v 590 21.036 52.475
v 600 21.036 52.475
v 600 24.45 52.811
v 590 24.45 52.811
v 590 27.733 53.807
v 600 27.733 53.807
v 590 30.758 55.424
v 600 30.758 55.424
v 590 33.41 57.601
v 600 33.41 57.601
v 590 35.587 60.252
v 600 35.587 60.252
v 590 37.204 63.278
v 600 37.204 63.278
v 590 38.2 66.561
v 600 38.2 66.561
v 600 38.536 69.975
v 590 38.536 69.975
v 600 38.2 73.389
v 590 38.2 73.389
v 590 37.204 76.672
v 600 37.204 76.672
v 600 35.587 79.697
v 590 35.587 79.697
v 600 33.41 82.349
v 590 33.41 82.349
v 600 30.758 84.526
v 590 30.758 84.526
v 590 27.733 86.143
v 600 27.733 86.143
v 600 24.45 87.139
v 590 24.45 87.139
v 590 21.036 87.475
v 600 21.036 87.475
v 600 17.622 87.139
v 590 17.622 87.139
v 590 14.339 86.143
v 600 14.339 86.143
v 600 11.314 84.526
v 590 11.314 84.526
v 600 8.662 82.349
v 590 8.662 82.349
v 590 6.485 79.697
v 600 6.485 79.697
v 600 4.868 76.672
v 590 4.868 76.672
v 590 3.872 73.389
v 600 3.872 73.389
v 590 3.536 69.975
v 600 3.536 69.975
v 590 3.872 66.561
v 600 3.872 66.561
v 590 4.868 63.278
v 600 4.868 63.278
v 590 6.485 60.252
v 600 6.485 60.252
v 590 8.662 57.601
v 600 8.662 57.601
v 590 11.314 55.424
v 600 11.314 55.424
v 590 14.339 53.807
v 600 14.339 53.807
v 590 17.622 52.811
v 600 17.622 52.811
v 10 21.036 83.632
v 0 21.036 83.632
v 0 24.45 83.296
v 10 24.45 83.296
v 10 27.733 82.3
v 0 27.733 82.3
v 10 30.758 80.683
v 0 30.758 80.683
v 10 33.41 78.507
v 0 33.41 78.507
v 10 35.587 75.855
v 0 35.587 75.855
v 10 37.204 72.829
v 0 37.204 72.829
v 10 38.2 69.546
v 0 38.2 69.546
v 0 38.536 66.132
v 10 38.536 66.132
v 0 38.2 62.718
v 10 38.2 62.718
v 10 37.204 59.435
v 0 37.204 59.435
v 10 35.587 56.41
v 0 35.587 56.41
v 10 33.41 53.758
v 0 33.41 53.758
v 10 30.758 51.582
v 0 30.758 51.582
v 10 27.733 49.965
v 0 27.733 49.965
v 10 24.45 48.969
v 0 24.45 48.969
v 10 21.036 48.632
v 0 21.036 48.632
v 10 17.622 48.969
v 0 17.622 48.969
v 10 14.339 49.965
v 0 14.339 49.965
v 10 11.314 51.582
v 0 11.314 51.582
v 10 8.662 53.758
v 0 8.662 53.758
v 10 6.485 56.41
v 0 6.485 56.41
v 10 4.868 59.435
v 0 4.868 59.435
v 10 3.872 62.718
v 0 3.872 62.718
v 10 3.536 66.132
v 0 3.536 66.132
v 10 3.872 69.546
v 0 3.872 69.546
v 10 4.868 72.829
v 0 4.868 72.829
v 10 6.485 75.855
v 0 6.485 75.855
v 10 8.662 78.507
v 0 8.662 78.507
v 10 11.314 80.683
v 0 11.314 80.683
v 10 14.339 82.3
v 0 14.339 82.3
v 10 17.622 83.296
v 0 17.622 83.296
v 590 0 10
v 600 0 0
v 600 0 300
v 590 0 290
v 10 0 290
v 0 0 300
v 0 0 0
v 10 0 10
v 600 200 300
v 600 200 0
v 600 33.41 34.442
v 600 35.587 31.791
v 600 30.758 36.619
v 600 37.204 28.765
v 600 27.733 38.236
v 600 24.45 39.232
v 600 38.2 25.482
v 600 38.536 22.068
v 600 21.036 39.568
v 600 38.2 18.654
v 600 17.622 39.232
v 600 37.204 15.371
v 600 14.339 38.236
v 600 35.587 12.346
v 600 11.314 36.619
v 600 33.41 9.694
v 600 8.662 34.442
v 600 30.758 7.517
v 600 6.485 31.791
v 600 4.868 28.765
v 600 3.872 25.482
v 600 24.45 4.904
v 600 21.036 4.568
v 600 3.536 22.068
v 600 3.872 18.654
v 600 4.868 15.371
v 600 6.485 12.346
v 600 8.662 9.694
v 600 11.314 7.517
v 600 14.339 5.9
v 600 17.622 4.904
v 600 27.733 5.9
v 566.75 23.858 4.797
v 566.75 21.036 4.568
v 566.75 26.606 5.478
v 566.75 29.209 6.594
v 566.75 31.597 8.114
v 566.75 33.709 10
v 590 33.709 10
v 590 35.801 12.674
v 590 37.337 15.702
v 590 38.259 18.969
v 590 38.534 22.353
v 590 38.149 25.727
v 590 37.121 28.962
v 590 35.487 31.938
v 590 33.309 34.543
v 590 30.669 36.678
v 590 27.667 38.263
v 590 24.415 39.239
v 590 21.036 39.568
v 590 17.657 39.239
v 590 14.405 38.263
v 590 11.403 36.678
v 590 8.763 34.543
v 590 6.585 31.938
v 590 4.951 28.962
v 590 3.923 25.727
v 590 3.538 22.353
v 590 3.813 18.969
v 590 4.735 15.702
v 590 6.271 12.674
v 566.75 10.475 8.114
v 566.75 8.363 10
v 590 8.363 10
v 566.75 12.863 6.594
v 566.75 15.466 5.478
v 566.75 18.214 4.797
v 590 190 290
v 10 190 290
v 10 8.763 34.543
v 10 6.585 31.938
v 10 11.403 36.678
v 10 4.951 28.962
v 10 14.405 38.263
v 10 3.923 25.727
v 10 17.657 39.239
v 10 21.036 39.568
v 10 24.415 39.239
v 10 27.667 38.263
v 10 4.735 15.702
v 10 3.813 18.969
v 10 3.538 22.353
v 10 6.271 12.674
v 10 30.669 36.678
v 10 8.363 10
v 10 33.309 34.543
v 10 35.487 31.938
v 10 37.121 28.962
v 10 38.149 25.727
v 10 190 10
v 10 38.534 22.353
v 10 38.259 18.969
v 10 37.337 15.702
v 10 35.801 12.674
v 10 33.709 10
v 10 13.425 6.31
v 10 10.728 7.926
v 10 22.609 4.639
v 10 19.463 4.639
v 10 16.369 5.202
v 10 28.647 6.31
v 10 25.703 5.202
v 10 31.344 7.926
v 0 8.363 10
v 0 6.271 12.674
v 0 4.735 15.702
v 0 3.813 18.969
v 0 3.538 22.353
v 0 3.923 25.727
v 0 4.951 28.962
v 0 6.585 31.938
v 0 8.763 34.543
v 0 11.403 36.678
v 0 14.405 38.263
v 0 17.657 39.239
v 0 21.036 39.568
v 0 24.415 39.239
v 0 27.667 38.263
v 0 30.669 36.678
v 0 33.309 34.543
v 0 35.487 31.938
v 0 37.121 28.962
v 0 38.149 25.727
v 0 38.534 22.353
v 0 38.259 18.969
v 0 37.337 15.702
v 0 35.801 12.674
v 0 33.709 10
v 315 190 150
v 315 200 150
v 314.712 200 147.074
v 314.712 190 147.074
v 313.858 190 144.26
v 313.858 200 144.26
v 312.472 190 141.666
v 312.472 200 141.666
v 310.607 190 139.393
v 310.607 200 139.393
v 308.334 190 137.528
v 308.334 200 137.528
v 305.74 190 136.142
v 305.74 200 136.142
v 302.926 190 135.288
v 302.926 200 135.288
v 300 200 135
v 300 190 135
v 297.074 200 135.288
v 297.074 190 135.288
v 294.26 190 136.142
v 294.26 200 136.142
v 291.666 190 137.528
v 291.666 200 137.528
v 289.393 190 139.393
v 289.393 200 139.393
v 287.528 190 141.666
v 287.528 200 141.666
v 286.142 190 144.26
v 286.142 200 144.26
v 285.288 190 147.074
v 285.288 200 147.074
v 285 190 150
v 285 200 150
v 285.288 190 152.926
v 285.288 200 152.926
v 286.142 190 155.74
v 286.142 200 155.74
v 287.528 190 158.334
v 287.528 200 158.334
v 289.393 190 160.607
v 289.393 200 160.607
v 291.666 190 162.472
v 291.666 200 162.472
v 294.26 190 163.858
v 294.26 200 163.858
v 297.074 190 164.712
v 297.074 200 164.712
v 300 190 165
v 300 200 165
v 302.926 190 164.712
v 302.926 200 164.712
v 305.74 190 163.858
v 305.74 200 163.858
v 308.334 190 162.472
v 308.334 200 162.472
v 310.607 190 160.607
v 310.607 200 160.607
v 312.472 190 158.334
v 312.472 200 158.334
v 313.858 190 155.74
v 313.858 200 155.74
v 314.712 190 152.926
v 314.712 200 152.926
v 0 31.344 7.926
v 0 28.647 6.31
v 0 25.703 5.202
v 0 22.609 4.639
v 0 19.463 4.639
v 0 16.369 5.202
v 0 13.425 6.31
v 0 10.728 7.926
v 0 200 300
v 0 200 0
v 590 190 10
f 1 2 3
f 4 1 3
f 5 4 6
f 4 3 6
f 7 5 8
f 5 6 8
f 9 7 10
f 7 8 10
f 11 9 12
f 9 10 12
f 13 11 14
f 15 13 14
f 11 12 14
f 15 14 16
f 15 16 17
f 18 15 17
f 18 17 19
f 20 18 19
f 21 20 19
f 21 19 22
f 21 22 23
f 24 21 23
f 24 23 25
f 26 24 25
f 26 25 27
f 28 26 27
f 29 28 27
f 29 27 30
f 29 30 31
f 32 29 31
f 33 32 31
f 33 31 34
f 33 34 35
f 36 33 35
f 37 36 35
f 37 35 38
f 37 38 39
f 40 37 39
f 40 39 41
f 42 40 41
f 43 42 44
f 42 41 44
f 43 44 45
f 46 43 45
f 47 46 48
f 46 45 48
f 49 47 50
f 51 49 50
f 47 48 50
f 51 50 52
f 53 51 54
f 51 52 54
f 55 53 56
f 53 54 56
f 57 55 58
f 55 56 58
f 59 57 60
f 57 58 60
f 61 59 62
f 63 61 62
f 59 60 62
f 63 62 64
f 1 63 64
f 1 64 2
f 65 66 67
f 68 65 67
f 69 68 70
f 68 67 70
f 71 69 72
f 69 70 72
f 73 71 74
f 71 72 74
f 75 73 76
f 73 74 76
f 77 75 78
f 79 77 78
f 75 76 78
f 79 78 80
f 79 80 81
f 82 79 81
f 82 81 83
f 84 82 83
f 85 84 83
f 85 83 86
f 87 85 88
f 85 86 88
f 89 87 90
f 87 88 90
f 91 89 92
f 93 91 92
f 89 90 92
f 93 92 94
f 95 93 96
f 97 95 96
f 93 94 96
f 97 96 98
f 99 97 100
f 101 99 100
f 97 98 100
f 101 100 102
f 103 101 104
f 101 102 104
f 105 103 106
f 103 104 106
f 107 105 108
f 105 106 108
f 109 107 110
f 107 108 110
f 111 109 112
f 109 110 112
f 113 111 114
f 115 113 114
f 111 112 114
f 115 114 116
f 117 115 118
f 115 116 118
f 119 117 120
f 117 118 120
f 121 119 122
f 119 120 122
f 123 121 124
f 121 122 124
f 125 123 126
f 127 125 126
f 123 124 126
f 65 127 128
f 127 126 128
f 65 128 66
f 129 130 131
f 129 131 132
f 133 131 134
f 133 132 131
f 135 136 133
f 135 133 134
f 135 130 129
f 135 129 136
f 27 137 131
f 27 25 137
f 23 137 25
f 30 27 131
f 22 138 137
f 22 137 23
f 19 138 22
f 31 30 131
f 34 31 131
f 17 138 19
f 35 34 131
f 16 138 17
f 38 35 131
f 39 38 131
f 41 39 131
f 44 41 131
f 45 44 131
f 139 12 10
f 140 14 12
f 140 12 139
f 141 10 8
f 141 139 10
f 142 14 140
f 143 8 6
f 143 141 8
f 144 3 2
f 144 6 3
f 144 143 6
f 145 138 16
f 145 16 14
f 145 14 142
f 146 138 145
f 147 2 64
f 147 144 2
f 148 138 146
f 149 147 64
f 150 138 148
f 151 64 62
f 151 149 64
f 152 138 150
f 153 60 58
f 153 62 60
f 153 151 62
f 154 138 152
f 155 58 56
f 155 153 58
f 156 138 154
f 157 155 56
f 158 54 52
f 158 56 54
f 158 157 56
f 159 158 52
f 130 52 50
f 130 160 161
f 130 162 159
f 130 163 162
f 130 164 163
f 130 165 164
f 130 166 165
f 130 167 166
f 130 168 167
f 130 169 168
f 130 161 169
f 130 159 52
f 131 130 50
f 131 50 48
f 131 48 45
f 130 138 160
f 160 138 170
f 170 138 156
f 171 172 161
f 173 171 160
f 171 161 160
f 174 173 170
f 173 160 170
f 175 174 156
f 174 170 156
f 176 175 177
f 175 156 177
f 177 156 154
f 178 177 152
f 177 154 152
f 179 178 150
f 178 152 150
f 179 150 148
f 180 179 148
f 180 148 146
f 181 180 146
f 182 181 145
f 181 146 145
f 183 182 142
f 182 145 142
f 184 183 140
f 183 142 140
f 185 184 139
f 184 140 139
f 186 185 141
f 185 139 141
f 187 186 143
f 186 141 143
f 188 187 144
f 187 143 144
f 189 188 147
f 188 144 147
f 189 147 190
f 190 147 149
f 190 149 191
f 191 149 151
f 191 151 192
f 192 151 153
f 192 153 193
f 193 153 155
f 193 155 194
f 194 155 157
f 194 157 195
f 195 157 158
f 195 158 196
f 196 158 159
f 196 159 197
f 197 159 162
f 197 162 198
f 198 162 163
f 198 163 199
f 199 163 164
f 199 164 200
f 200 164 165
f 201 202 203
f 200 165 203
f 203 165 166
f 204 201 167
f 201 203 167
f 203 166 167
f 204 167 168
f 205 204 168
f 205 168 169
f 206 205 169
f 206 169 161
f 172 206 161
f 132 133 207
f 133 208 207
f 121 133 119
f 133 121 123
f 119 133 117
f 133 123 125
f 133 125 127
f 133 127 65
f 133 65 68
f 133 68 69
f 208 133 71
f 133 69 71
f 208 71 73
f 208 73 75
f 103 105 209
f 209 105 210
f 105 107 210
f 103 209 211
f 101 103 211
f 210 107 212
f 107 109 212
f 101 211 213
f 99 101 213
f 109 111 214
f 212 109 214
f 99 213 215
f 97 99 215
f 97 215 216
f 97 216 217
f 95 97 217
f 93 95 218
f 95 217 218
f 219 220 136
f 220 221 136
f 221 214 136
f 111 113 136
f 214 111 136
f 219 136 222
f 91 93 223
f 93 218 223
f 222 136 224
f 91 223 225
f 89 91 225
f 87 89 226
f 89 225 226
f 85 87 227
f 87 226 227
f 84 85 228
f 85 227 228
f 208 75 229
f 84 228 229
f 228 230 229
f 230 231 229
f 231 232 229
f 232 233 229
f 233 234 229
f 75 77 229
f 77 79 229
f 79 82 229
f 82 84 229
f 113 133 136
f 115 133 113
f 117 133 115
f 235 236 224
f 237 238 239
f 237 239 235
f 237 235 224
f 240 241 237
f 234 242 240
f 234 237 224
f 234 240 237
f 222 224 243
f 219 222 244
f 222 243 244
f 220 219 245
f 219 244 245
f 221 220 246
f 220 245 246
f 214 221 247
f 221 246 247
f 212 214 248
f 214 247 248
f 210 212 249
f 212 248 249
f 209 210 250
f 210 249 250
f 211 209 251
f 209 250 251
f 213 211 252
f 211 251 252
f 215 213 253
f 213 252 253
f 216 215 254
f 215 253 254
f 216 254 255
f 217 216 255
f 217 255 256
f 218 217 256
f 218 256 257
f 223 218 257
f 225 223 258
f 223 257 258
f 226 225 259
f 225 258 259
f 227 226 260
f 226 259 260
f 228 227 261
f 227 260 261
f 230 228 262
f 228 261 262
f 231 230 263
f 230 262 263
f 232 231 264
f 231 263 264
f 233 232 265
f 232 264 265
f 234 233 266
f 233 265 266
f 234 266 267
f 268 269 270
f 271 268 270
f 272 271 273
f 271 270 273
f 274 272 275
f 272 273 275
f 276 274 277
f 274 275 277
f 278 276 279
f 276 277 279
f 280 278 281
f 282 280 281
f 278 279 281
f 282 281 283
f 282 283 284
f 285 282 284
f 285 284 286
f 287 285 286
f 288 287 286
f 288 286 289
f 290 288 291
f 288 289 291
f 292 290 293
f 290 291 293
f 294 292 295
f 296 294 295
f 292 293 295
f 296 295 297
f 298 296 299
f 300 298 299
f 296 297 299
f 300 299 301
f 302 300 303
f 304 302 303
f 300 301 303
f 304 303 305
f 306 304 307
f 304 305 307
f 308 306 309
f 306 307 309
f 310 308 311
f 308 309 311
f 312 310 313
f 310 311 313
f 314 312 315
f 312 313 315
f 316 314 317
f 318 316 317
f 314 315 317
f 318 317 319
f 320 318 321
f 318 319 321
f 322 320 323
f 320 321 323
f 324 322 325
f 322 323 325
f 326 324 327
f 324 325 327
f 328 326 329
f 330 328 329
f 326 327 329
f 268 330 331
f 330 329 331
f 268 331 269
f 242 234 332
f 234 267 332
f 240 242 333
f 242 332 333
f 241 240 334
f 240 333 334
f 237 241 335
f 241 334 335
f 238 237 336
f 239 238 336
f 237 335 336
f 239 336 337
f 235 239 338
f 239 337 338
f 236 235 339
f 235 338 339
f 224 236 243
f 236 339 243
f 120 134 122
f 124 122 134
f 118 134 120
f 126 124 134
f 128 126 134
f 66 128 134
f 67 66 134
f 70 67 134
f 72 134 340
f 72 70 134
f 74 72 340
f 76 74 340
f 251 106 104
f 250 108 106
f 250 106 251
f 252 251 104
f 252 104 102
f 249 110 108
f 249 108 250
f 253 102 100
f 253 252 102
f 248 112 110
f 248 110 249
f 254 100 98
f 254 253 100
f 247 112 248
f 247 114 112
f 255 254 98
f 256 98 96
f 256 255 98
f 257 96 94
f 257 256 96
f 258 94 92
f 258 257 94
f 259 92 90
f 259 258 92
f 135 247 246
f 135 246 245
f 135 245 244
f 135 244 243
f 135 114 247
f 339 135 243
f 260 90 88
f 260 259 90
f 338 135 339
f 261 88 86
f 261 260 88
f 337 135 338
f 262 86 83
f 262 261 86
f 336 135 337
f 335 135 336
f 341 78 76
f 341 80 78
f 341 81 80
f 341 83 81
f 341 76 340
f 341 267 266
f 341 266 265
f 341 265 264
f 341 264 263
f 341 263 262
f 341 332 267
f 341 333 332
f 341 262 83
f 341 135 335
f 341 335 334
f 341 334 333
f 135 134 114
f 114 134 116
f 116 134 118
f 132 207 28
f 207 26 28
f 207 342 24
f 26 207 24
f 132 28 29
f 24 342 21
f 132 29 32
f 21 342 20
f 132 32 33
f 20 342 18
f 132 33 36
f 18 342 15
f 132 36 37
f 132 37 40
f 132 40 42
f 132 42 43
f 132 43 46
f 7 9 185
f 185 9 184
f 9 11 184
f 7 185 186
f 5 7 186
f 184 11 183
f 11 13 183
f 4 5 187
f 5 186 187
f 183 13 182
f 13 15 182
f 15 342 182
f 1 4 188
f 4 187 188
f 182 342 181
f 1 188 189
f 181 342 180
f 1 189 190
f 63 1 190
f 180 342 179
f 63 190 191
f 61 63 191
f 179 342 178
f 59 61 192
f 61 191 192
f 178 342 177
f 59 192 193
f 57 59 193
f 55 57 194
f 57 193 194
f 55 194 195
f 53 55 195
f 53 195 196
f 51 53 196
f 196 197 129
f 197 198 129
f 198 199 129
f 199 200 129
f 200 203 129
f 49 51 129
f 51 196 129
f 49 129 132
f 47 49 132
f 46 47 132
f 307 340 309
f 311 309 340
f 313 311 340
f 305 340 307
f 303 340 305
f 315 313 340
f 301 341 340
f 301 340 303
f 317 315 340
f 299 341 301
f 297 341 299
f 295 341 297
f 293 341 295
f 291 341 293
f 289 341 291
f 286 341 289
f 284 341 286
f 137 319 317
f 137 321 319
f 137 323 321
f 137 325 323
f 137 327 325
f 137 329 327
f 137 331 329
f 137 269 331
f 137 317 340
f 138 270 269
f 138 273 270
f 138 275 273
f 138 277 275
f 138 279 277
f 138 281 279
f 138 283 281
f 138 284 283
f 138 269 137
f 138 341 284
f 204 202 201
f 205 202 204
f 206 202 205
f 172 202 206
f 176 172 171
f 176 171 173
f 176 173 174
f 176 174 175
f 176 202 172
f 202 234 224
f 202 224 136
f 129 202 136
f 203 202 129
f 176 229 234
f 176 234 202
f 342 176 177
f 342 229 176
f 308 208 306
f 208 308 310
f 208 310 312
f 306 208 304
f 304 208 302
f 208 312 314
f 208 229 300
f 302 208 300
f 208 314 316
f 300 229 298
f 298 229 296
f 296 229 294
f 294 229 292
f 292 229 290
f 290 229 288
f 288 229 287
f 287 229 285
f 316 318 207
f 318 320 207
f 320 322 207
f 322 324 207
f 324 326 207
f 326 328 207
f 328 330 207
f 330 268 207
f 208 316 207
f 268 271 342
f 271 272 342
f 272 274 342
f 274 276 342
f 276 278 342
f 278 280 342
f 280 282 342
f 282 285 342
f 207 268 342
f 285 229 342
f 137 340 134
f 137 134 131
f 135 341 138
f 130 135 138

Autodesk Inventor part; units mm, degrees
ref_plane "YZ Plane" through (0, 0, 0) normal (1, 0, 0) x (0, 1, 0)
ref_plane "XZ Plane" through (0, 0, 0) normal (0, 1, 0) x (-1, 0, 0)
ref_plane "XY Plane" through (0, 0, 0) normal (0, 0, 1) x (1, 0, 0)
sketch "Boceto1" plane through (0, 0, 0) normal (0, 0, 1) x (1, 0, 0)
  point P0 (0, 0)
sketch "Boceto2" plane through (0, 0, 0) normal (0, 0, 1) x (1, 0, 0)
  line L0 (0, 0) -> (0, 200)
  line L1 (0, 200) -> (600, 200)
  line L2 (600, 200) -> (600, 0)
  line L3 (600, 0) -> (0, 0)
  dimension "d0" = 200
  dimension "d1" = 600
  dimension "d2" = 200
  dimension "d3" = 600
extrude "Extrusión1" add sketch "Boceto2" along normal blind 300
shell "Vaciado1" thickness 10 removed faces 1 at (400, 0, 100)
sketch "Boceto3" plane through (0, 200, 0) normal (0, 1, 0) x (1, 0, 0)
  point P0 (0, 0)
sketch "Boceto4" plane through (0, 200, 0) normal (0, 1, 0) x (1, 0, 0)
  point P0 (0, 0)
sketch "Boceto5" plane through (0, 200, 0) normal (0, 1, 0) x (1, 0, 0)
  point P0 (0, 0)
sketch "Boceto6" plane through (0, 200, 0) normal (0, 1, 0) x (1, 0, 0)
  circle A0 centre (300, -150) radius 15
  point P0 (0, 0)
  dimension "d9" = 30
extrude "Extrusión2" cut sketch "Boceto6" against normal blind 33.25
sketch "Boceto7" plane through (0, 200, 0) normal (0, 1, 0) x (1, 0, 0)
  point P0 (0, 0)
sketch "Boceto8" plane through (600, 0, 0) normal (1, 0, 0) x (0, 0, -1)
  circle A0 centre (-22.0681, 21.036) radius 17.5
  circle A1 centre (-69.9749, 21.036) radius 17.5
  point P0 (0, 0)
  dimension "d12" = 35
  dimension "d13" = 35
extrude "Extrusión3" cut sketch "Boceto8" against normal blind 33.25
sketch "Boceto9" plane through (0, 0, 0) normal (-1, 0, 0) x (0, 0, 1)
  arc A0 (10, 8.3628) -> (10, 33.7092) centre (22.0681, 21.036) ccw projected
  circle A1 centre (22.0681, 21.036) radius 17.5
  circle A2 centre (66.1324, 21.036) radius 17.5
  point P0 (0, 0)
  dimension "d16" = 35
  dimension "d17" = 35
extrude "Extrusión4" cut sketch "Boceto9" against normal blind 10
